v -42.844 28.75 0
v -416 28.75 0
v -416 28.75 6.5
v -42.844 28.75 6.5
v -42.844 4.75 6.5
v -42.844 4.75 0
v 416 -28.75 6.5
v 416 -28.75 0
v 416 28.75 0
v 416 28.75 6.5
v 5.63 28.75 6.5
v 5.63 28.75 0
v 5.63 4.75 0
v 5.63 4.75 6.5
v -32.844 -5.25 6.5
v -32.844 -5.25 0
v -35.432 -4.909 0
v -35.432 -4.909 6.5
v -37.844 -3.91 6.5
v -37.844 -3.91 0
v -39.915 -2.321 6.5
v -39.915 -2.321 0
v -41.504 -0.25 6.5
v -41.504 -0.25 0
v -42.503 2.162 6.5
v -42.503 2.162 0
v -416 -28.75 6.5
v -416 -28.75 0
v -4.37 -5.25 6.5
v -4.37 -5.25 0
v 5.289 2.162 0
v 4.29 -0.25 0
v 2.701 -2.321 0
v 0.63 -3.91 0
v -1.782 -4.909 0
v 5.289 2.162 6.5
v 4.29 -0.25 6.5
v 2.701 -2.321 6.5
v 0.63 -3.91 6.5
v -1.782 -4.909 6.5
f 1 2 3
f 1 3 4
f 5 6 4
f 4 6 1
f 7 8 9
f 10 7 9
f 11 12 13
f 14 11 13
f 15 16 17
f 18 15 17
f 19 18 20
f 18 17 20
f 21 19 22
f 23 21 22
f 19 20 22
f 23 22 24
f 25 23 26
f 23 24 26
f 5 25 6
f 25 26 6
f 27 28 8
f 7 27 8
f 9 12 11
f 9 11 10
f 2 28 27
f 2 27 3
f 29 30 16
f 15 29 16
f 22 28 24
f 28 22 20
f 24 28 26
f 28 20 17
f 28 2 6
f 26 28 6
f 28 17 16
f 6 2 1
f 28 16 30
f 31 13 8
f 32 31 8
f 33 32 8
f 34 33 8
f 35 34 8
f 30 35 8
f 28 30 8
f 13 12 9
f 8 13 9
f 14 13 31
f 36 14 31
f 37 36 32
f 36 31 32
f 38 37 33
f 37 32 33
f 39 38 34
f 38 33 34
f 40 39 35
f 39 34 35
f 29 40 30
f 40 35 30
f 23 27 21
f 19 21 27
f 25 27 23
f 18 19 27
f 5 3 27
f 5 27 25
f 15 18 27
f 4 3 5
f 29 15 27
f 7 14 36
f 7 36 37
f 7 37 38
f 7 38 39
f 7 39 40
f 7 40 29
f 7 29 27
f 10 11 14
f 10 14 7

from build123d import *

# Parameters (mm, degrees)
ESQUISSE1_W             = 832
ESQUISSE1_H             = 57.5
BOSS_EXTRU_1_DEPTH      = 6.5
ENL_V_MAT_EXTRU_1_DEPTH = 418.042938437


with BuildPart() as part:
    # Esquisse1 → Boss.-Extru.1 (new body)
    with BuildSketch(Plane.XY):
        Rectangle(ESQUISSE1_W, ESQUISSE1_H)
    extrude(amount=BOSS_EXTRU_1_DEPTH)

    # Esquisse2 → Enlèv. mat.-Extru.1 (cut, through all)
    with BuildSketch(Plane(origin=(0, 0, 0), x_dir=(-1, 0, 0), z_dir=(0, 0, -1))):
        with BuildLine():
            Line((4.37, -5.25), (32.84397684, -5.25))
            ThreePointArc((32.84397684, -5.25), (39.915044651, -2.321067812), (42.84397684, 4.75))
            Line((42.84397684, 4.75), (42.84397684, 32.796121721))
            ThreePointArc((42.84397684, 32.796121721), (39.915044651, 39.867189532), (32.84397684, 42.796121721))
            Line((32.84397684, 42.796121721), (4.37, 42.796121721))
            ThreePointArc((4.37, 42.796121721), (-2.701067812, 39.867189532), (-5.63, 32.796121721))
            Line((-5.63, 32.796121721), (-5.63, 4.75))
            ThreePointArc((-5.63, 4.75), (-2.701067812, -2.321067812), (4.37, -5.25))
        make_face()
    extrude(amount=-ENL_V_MAT_EXTRU_1_DEPTH, mode=Mode.SUBTRACT)


solid = part.part
